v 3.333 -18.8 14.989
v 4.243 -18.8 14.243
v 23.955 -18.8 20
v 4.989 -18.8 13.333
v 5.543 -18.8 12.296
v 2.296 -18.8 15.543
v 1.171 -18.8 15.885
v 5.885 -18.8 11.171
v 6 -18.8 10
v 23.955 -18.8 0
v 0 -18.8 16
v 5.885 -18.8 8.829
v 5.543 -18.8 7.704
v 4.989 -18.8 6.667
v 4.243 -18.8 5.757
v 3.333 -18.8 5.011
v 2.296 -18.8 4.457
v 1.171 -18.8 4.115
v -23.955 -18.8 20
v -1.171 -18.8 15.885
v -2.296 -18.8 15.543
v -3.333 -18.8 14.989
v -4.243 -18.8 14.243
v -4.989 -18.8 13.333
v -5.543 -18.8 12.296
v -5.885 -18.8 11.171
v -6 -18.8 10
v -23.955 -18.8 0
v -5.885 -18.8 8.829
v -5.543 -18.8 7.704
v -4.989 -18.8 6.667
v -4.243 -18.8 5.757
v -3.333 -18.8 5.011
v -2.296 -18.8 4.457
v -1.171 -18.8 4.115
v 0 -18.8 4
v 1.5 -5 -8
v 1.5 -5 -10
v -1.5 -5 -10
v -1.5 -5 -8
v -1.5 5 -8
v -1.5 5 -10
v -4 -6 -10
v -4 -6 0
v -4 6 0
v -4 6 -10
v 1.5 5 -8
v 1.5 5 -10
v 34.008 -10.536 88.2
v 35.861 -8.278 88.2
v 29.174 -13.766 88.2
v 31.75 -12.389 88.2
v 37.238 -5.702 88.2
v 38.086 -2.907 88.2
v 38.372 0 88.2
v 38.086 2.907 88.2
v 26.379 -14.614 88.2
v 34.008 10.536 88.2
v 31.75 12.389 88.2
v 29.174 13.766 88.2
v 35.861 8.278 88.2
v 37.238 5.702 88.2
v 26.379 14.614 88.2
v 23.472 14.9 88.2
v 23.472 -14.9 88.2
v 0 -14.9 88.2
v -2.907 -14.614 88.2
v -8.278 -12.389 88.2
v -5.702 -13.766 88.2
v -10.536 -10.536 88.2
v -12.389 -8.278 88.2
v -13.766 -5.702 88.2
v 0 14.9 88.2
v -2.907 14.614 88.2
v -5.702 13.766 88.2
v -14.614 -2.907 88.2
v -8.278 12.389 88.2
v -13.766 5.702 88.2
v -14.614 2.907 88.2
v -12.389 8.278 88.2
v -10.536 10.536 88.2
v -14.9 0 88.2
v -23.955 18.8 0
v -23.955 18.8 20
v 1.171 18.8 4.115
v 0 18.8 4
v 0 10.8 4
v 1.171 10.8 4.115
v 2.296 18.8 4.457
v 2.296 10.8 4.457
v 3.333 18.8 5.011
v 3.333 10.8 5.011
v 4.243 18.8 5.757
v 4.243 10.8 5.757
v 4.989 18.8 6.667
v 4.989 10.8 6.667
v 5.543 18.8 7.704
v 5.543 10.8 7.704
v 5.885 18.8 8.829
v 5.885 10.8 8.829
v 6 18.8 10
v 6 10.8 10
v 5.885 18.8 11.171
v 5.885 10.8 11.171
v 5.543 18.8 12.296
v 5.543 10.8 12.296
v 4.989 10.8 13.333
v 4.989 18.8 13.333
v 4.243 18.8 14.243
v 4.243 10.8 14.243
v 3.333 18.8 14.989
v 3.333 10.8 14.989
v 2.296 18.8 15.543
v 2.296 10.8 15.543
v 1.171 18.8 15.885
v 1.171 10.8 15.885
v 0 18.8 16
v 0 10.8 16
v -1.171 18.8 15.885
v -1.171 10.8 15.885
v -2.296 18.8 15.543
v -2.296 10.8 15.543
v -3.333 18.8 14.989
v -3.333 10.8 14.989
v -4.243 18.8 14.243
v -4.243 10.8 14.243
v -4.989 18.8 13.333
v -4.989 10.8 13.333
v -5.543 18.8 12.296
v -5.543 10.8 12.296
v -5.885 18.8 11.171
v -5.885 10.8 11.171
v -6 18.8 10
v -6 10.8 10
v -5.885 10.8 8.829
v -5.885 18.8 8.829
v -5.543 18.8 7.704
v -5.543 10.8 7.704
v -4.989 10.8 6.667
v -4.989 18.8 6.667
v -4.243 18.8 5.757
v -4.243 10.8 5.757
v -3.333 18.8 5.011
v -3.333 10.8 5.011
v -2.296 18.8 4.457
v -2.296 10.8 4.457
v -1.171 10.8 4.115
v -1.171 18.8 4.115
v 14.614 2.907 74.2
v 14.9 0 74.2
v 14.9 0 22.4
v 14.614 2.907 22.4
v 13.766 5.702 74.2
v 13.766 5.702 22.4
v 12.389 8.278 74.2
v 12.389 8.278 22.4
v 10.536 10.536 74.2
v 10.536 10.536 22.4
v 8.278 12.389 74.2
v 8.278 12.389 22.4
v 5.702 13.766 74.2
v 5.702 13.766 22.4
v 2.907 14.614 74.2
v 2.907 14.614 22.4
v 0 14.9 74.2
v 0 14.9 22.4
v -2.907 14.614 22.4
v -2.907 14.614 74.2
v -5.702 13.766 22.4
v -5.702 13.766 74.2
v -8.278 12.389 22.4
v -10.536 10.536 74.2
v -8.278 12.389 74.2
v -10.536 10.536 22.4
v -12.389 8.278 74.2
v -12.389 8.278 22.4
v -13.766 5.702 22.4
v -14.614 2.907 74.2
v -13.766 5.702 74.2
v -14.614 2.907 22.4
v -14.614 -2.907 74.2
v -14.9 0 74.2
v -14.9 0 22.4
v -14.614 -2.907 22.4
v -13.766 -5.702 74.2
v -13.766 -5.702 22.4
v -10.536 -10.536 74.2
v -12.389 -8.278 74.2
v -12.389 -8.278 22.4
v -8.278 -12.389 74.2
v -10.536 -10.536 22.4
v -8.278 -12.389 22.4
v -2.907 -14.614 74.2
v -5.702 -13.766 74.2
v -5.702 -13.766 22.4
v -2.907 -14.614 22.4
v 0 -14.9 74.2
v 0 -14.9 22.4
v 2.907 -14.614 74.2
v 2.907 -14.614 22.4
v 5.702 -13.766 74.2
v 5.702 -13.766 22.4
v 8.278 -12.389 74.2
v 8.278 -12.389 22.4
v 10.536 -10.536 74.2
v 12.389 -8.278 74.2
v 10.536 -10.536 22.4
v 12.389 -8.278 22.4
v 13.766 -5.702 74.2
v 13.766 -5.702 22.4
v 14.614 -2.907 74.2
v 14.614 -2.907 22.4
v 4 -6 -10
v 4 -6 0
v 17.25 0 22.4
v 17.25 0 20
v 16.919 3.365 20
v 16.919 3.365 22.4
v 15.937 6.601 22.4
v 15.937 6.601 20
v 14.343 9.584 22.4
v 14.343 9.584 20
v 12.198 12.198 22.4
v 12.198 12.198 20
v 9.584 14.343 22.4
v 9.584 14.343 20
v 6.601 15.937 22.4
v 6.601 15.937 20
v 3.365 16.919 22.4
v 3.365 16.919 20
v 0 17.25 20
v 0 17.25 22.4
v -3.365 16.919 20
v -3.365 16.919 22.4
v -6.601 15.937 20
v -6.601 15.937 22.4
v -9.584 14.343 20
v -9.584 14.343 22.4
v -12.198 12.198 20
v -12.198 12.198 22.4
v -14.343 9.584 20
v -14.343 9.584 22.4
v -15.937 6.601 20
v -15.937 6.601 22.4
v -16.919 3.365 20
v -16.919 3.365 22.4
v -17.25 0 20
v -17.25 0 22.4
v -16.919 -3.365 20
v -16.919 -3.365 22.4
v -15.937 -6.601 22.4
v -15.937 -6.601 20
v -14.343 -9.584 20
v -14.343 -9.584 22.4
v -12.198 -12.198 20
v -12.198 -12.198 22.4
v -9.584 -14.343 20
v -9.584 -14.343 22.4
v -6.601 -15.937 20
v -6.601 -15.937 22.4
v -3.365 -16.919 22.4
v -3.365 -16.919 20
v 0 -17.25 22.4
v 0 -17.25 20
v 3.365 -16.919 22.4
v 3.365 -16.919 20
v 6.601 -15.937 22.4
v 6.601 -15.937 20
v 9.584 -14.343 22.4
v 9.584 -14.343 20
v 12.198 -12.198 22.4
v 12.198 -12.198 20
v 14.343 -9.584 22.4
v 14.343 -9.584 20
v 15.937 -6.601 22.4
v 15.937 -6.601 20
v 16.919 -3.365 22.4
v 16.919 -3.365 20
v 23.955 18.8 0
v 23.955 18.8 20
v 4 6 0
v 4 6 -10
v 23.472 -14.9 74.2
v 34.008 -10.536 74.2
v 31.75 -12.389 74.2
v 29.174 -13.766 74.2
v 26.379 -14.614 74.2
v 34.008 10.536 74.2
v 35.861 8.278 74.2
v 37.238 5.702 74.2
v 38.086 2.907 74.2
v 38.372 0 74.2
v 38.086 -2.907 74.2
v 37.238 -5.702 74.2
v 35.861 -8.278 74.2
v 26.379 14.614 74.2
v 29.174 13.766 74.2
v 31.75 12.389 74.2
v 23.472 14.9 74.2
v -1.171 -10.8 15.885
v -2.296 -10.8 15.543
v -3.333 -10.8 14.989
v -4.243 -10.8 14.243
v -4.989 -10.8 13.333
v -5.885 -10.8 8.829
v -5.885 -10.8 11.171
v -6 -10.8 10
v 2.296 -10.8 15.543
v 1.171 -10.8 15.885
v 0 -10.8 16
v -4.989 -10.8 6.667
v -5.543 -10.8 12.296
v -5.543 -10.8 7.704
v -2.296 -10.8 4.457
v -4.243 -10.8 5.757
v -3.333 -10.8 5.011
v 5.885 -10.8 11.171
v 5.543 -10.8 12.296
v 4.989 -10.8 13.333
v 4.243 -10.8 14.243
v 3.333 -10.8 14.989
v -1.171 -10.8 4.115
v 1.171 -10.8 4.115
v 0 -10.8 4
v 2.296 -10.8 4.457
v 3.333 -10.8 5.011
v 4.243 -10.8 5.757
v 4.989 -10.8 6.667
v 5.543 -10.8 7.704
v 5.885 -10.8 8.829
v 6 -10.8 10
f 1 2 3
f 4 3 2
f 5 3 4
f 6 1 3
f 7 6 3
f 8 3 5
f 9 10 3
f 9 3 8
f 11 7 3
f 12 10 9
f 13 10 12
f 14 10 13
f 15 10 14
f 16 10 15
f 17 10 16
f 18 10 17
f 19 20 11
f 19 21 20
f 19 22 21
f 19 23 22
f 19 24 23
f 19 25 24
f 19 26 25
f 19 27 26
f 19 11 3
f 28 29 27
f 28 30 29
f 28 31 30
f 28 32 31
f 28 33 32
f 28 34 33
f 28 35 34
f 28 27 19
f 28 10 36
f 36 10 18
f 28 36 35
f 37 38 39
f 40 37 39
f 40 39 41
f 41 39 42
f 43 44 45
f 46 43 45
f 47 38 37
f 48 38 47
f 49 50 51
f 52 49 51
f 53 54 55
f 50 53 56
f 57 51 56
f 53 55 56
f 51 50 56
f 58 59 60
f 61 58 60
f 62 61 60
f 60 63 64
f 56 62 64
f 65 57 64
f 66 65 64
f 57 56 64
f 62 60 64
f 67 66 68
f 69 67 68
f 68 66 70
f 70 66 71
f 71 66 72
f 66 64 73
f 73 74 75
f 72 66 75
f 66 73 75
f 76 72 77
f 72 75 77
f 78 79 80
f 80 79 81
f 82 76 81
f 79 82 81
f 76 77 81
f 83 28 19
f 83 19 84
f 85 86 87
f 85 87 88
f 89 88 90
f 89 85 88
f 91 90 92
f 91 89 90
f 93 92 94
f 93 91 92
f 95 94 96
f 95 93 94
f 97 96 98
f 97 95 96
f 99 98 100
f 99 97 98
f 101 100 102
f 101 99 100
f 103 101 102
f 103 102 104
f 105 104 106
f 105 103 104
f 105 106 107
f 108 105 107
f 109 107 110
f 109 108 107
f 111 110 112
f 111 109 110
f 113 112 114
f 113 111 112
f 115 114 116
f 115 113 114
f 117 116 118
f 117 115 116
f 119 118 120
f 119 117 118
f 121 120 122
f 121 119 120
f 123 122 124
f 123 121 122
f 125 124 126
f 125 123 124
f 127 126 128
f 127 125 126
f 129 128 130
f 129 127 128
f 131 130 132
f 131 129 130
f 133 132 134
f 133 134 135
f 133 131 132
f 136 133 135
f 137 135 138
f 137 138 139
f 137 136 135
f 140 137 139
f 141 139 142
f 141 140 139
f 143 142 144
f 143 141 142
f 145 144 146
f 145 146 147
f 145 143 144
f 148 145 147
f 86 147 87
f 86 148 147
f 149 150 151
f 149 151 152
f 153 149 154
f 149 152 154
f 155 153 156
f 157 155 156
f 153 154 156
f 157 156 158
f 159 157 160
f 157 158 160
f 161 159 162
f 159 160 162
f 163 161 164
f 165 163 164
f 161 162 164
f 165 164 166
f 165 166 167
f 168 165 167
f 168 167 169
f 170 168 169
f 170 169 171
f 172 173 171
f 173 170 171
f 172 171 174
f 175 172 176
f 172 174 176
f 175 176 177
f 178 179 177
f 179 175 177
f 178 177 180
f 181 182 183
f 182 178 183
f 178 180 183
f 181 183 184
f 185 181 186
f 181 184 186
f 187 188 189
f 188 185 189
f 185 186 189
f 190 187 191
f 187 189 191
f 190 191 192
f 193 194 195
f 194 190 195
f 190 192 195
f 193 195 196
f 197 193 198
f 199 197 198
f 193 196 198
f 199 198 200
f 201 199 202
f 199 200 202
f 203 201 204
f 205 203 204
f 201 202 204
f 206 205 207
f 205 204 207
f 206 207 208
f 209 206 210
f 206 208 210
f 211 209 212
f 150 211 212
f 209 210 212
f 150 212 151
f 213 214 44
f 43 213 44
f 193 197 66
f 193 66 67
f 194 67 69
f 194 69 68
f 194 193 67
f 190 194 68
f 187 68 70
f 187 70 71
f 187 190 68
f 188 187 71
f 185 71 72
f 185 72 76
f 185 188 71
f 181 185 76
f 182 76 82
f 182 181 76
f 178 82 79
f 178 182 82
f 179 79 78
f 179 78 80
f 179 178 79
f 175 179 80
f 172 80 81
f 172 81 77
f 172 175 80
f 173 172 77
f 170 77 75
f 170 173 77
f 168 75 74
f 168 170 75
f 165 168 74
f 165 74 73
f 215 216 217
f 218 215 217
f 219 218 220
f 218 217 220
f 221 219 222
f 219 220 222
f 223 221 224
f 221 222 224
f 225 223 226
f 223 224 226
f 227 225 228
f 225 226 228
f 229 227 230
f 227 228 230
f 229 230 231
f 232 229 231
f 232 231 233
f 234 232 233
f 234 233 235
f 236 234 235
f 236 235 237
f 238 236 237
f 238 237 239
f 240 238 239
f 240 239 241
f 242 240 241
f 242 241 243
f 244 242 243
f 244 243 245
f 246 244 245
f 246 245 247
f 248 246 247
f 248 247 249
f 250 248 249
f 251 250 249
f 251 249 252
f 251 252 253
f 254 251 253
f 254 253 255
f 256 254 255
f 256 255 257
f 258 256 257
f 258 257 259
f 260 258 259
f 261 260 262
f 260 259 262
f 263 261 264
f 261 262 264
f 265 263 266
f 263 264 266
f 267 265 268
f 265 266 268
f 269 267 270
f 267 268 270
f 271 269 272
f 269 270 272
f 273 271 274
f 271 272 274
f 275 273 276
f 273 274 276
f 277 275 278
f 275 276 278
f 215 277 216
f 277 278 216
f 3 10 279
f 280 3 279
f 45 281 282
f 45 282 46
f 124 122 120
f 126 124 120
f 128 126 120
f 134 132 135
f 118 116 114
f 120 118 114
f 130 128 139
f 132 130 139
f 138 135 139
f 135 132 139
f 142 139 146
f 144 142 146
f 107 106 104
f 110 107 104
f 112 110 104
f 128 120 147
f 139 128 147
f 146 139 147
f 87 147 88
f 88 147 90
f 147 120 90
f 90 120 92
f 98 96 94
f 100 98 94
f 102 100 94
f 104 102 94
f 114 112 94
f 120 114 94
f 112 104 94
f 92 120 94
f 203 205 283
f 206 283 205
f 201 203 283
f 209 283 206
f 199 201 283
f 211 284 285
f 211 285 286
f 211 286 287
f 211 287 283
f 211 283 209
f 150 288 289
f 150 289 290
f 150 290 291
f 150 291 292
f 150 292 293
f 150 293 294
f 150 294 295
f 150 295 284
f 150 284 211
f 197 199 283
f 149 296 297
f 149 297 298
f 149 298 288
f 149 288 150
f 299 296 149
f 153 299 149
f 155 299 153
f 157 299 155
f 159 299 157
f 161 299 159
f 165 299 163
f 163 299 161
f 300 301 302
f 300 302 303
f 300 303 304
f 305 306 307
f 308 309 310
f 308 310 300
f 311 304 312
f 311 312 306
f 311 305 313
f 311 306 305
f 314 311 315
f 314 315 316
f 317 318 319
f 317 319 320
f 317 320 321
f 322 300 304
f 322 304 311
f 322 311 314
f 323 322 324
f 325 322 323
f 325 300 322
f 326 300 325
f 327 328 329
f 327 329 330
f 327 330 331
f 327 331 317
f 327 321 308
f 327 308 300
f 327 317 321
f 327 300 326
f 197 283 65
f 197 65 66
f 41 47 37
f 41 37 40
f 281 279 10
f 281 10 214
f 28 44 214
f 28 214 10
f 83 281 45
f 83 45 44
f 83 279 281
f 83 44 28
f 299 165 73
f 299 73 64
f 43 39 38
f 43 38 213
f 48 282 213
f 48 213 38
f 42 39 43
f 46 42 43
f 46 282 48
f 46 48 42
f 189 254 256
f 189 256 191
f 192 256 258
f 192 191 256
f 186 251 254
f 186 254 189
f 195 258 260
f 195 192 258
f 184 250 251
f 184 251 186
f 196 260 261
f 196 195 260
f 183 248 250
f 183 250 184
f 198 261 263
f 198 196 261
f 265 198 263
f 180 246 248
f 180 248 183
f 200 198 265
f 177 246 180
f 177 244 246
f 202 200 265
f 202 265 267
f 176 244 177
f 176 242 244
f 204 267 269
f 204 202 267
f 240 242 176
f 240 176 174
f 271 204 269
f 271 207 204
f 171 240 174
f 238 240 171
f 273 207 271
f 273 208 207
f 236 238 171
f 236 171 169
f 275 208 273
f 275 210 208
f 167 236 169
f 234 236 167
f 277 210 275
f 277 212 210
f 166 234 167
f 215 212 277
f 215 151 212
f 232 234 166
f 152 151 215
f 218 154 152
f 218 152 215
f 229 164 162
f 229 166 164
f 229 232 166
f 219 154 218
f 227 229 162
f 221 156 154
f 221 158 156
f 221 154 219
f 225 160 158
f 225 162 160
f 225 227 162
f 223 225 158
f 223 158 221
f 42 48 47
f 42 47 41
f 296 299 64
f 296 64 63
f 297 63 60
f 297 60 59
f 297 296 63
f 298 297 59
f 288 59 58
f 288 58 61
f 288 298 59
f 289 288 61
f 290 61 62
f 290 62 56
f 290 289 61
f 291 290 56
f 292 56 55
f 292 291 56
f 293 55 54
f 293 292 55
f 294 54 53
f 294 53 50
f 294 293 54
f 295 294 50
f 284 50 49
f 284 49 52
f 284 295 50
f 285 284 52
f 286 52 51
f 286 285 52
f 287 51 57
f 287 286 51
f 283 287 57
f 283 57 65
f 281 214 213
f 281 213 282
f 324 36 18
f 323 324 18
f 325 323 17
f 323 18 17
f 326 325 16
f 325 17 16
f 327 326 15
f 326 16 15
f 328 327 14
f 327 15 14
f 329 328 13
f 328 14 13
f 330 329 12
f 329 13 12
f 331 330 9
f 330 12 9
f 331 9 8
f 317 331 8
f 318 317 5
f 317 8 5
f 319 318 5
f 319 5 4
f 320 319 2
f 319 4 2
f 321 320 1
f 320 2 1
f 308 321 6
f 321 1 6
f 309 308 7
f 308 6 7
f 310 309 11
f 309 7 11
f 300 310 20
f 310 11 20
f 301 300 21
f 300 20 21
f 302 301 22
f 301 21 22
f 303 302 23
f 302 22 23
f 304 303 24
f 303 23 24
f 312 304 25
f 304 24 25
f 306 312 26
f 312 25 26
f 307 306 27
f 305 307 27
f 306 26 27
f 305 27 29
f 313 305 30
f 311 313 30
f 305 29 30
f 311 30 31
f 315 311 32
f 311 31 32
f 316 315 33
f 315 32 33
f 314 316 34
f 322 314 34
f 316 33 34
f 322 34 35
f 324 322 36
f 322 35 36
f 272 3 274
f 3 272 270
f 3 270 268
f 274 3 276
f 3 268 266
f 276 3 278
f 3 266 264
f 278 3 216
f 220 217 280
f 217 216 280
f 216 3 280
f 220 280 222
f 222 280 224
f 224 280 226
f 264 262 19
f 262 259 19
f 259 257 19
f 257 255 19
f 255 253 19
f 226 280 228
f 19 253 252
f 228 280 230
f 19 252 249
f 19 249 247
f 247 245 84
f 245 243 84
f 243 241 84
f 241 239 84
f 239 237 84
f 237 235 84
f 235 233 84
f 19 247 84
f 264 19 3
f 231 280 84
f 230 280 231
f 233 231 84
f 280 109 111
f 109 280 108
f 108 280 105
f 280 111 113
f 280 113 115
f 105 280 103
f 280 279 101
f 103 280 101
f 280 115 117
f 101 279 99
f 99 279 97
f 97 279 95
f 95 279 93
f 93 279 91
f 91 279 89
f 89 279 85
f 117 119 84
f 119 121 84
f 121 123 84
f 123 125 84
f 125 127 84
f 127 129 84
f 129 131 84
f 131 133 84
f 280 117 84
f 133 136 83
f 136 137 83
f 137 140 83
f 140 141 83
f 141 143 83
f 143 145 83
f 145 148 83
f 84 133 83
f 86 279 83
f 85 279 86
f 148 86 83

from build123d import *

# Parameters (mm, degrees)
SKETCH2_R           = 17.25
BOSS_EXTRUDE1_DEPTH = 22.4
SKETCH3_R           = 14.9
BOSS_EXTRUDE2_DEPTH = 38.4
SKETCH4_R           = 14.9
BOSS_EXTRUDE3_DEPTH = 13.4
BOSS_EXTRUDE4_DEPTH = 14
SKETCH7_W           = 8
SKETCH7_H           = 12
BOSS_EXTRUDE5_DEPTH = 10
SKETCH9_W           = 3
SKETCH9_H           = 10
CUT_EXTRUDE1_DEPTH  = 2
SKETCH10_W          = 47.910910278
SKETCH10_H          = 37.599432614
BOSS_EXTRUDE6_DEPTH = 20
SKETCH12_R          = 6
CUT_EXTRUDE2_DEPTH  = 8


with BuildPart() as part:
    # Sketch2 → Boss-Extrude1 (new body)
    with BuildSketch(Plane.XY):
        Circle(SKETCH2_R)
    extrude(amount=BOSS_EXTRUDE1_DEPTH)

    # Sketch3 → Boss-Extrude2 (add)
    with BuildSketch(Plane.XY.offset(22.4)):
        Circle(SKETCH3_R)
    extrude(amount=BOSS_EXTRUDE2_DEPTH)

    # Sketch4 → Boss-Extrude3 (add)
    with BuildSketch(Plane.XY.offset(60.8)):
        Circle(SKETCH4_R)
    extrude(amount=BOSS_EXTRUDE3_DEPTH)

    # Sketch6 → Boss-Extrude4 (add)
    with BuildSketch(Plane.XY.offset(74.2)):
        with BuildLine():
            Line((0, 14.9), (23.472492354, 14.9))
            ThreePointArc((23.472492354, 14.9), (38.372492354, 0), (23.472492354, -14.9))
            Line((23.472492354, -14.9), (0, -14.9))
            ThreePointArc((0, -14.9), (-14.9, 0), (0, 14.9))
        make_face()
    extrude(amount=BOSS_EXTRUDE4_DEPTH)

    # Sketch7 → Boss-Extrude5 (add)
    with BuildSketch(Plane(origin=(0, 0, 0), x_dir=(-1, 0, 0), z_dir=(0, 0, -1))):
        Rectangle(SKETCH7_W, SKETCH7_H)
    extrude(amount=BOSS_EXTRUDE5_DEPTH)

    # Sketch9 → Cut-Extrude1 (cut)
    with BuildSketch(Plane(origin=(0, 0, -10), x_dir=(-1, 0, 0), z_dir=(0, 0, -1))):
        Rectangle(SKETCH9_W, SKETCH9_H)
    extrude(amount=-CUT_EXTRUDE1_DEPTH, mode=Mode.SUBTRACT)

    # Sketch10 → Boss-Extrude6 (add)
    with BuildSketch(Plane(origin=(0, 0, 0), x_dir=(-1, 0, 0), z_dir=(0, 0, -1))):
        Rectangle(SKETCH10_W, SKETCH10_H)
    extrude(amount=-BOSS_EXTRUDE6_DEPTH)

    # Sketch12 → Cut-Extrude2 (cut)
    with BuildSketch(Plane.XZ.offset(18.799716307)):
        with Locations(Location((0, 10, 0), (0, 0, 270))):
            Circle(SKETCH12_R)
    cut_extrude2 = extrude(amount=-CUT_EXTRUDE2_DEPTH, mode=Mode.SUBTRACT)

    # Mirror1: Cut-Extrude2 across plane
    add(cut_extrude2.mirror(Plane(origin=(0, 0, 0), x_dir=(0, 0, 1), z_dir=(0, -1, 0))), mode=Mode.SUBTRACT)


solid = part.part
